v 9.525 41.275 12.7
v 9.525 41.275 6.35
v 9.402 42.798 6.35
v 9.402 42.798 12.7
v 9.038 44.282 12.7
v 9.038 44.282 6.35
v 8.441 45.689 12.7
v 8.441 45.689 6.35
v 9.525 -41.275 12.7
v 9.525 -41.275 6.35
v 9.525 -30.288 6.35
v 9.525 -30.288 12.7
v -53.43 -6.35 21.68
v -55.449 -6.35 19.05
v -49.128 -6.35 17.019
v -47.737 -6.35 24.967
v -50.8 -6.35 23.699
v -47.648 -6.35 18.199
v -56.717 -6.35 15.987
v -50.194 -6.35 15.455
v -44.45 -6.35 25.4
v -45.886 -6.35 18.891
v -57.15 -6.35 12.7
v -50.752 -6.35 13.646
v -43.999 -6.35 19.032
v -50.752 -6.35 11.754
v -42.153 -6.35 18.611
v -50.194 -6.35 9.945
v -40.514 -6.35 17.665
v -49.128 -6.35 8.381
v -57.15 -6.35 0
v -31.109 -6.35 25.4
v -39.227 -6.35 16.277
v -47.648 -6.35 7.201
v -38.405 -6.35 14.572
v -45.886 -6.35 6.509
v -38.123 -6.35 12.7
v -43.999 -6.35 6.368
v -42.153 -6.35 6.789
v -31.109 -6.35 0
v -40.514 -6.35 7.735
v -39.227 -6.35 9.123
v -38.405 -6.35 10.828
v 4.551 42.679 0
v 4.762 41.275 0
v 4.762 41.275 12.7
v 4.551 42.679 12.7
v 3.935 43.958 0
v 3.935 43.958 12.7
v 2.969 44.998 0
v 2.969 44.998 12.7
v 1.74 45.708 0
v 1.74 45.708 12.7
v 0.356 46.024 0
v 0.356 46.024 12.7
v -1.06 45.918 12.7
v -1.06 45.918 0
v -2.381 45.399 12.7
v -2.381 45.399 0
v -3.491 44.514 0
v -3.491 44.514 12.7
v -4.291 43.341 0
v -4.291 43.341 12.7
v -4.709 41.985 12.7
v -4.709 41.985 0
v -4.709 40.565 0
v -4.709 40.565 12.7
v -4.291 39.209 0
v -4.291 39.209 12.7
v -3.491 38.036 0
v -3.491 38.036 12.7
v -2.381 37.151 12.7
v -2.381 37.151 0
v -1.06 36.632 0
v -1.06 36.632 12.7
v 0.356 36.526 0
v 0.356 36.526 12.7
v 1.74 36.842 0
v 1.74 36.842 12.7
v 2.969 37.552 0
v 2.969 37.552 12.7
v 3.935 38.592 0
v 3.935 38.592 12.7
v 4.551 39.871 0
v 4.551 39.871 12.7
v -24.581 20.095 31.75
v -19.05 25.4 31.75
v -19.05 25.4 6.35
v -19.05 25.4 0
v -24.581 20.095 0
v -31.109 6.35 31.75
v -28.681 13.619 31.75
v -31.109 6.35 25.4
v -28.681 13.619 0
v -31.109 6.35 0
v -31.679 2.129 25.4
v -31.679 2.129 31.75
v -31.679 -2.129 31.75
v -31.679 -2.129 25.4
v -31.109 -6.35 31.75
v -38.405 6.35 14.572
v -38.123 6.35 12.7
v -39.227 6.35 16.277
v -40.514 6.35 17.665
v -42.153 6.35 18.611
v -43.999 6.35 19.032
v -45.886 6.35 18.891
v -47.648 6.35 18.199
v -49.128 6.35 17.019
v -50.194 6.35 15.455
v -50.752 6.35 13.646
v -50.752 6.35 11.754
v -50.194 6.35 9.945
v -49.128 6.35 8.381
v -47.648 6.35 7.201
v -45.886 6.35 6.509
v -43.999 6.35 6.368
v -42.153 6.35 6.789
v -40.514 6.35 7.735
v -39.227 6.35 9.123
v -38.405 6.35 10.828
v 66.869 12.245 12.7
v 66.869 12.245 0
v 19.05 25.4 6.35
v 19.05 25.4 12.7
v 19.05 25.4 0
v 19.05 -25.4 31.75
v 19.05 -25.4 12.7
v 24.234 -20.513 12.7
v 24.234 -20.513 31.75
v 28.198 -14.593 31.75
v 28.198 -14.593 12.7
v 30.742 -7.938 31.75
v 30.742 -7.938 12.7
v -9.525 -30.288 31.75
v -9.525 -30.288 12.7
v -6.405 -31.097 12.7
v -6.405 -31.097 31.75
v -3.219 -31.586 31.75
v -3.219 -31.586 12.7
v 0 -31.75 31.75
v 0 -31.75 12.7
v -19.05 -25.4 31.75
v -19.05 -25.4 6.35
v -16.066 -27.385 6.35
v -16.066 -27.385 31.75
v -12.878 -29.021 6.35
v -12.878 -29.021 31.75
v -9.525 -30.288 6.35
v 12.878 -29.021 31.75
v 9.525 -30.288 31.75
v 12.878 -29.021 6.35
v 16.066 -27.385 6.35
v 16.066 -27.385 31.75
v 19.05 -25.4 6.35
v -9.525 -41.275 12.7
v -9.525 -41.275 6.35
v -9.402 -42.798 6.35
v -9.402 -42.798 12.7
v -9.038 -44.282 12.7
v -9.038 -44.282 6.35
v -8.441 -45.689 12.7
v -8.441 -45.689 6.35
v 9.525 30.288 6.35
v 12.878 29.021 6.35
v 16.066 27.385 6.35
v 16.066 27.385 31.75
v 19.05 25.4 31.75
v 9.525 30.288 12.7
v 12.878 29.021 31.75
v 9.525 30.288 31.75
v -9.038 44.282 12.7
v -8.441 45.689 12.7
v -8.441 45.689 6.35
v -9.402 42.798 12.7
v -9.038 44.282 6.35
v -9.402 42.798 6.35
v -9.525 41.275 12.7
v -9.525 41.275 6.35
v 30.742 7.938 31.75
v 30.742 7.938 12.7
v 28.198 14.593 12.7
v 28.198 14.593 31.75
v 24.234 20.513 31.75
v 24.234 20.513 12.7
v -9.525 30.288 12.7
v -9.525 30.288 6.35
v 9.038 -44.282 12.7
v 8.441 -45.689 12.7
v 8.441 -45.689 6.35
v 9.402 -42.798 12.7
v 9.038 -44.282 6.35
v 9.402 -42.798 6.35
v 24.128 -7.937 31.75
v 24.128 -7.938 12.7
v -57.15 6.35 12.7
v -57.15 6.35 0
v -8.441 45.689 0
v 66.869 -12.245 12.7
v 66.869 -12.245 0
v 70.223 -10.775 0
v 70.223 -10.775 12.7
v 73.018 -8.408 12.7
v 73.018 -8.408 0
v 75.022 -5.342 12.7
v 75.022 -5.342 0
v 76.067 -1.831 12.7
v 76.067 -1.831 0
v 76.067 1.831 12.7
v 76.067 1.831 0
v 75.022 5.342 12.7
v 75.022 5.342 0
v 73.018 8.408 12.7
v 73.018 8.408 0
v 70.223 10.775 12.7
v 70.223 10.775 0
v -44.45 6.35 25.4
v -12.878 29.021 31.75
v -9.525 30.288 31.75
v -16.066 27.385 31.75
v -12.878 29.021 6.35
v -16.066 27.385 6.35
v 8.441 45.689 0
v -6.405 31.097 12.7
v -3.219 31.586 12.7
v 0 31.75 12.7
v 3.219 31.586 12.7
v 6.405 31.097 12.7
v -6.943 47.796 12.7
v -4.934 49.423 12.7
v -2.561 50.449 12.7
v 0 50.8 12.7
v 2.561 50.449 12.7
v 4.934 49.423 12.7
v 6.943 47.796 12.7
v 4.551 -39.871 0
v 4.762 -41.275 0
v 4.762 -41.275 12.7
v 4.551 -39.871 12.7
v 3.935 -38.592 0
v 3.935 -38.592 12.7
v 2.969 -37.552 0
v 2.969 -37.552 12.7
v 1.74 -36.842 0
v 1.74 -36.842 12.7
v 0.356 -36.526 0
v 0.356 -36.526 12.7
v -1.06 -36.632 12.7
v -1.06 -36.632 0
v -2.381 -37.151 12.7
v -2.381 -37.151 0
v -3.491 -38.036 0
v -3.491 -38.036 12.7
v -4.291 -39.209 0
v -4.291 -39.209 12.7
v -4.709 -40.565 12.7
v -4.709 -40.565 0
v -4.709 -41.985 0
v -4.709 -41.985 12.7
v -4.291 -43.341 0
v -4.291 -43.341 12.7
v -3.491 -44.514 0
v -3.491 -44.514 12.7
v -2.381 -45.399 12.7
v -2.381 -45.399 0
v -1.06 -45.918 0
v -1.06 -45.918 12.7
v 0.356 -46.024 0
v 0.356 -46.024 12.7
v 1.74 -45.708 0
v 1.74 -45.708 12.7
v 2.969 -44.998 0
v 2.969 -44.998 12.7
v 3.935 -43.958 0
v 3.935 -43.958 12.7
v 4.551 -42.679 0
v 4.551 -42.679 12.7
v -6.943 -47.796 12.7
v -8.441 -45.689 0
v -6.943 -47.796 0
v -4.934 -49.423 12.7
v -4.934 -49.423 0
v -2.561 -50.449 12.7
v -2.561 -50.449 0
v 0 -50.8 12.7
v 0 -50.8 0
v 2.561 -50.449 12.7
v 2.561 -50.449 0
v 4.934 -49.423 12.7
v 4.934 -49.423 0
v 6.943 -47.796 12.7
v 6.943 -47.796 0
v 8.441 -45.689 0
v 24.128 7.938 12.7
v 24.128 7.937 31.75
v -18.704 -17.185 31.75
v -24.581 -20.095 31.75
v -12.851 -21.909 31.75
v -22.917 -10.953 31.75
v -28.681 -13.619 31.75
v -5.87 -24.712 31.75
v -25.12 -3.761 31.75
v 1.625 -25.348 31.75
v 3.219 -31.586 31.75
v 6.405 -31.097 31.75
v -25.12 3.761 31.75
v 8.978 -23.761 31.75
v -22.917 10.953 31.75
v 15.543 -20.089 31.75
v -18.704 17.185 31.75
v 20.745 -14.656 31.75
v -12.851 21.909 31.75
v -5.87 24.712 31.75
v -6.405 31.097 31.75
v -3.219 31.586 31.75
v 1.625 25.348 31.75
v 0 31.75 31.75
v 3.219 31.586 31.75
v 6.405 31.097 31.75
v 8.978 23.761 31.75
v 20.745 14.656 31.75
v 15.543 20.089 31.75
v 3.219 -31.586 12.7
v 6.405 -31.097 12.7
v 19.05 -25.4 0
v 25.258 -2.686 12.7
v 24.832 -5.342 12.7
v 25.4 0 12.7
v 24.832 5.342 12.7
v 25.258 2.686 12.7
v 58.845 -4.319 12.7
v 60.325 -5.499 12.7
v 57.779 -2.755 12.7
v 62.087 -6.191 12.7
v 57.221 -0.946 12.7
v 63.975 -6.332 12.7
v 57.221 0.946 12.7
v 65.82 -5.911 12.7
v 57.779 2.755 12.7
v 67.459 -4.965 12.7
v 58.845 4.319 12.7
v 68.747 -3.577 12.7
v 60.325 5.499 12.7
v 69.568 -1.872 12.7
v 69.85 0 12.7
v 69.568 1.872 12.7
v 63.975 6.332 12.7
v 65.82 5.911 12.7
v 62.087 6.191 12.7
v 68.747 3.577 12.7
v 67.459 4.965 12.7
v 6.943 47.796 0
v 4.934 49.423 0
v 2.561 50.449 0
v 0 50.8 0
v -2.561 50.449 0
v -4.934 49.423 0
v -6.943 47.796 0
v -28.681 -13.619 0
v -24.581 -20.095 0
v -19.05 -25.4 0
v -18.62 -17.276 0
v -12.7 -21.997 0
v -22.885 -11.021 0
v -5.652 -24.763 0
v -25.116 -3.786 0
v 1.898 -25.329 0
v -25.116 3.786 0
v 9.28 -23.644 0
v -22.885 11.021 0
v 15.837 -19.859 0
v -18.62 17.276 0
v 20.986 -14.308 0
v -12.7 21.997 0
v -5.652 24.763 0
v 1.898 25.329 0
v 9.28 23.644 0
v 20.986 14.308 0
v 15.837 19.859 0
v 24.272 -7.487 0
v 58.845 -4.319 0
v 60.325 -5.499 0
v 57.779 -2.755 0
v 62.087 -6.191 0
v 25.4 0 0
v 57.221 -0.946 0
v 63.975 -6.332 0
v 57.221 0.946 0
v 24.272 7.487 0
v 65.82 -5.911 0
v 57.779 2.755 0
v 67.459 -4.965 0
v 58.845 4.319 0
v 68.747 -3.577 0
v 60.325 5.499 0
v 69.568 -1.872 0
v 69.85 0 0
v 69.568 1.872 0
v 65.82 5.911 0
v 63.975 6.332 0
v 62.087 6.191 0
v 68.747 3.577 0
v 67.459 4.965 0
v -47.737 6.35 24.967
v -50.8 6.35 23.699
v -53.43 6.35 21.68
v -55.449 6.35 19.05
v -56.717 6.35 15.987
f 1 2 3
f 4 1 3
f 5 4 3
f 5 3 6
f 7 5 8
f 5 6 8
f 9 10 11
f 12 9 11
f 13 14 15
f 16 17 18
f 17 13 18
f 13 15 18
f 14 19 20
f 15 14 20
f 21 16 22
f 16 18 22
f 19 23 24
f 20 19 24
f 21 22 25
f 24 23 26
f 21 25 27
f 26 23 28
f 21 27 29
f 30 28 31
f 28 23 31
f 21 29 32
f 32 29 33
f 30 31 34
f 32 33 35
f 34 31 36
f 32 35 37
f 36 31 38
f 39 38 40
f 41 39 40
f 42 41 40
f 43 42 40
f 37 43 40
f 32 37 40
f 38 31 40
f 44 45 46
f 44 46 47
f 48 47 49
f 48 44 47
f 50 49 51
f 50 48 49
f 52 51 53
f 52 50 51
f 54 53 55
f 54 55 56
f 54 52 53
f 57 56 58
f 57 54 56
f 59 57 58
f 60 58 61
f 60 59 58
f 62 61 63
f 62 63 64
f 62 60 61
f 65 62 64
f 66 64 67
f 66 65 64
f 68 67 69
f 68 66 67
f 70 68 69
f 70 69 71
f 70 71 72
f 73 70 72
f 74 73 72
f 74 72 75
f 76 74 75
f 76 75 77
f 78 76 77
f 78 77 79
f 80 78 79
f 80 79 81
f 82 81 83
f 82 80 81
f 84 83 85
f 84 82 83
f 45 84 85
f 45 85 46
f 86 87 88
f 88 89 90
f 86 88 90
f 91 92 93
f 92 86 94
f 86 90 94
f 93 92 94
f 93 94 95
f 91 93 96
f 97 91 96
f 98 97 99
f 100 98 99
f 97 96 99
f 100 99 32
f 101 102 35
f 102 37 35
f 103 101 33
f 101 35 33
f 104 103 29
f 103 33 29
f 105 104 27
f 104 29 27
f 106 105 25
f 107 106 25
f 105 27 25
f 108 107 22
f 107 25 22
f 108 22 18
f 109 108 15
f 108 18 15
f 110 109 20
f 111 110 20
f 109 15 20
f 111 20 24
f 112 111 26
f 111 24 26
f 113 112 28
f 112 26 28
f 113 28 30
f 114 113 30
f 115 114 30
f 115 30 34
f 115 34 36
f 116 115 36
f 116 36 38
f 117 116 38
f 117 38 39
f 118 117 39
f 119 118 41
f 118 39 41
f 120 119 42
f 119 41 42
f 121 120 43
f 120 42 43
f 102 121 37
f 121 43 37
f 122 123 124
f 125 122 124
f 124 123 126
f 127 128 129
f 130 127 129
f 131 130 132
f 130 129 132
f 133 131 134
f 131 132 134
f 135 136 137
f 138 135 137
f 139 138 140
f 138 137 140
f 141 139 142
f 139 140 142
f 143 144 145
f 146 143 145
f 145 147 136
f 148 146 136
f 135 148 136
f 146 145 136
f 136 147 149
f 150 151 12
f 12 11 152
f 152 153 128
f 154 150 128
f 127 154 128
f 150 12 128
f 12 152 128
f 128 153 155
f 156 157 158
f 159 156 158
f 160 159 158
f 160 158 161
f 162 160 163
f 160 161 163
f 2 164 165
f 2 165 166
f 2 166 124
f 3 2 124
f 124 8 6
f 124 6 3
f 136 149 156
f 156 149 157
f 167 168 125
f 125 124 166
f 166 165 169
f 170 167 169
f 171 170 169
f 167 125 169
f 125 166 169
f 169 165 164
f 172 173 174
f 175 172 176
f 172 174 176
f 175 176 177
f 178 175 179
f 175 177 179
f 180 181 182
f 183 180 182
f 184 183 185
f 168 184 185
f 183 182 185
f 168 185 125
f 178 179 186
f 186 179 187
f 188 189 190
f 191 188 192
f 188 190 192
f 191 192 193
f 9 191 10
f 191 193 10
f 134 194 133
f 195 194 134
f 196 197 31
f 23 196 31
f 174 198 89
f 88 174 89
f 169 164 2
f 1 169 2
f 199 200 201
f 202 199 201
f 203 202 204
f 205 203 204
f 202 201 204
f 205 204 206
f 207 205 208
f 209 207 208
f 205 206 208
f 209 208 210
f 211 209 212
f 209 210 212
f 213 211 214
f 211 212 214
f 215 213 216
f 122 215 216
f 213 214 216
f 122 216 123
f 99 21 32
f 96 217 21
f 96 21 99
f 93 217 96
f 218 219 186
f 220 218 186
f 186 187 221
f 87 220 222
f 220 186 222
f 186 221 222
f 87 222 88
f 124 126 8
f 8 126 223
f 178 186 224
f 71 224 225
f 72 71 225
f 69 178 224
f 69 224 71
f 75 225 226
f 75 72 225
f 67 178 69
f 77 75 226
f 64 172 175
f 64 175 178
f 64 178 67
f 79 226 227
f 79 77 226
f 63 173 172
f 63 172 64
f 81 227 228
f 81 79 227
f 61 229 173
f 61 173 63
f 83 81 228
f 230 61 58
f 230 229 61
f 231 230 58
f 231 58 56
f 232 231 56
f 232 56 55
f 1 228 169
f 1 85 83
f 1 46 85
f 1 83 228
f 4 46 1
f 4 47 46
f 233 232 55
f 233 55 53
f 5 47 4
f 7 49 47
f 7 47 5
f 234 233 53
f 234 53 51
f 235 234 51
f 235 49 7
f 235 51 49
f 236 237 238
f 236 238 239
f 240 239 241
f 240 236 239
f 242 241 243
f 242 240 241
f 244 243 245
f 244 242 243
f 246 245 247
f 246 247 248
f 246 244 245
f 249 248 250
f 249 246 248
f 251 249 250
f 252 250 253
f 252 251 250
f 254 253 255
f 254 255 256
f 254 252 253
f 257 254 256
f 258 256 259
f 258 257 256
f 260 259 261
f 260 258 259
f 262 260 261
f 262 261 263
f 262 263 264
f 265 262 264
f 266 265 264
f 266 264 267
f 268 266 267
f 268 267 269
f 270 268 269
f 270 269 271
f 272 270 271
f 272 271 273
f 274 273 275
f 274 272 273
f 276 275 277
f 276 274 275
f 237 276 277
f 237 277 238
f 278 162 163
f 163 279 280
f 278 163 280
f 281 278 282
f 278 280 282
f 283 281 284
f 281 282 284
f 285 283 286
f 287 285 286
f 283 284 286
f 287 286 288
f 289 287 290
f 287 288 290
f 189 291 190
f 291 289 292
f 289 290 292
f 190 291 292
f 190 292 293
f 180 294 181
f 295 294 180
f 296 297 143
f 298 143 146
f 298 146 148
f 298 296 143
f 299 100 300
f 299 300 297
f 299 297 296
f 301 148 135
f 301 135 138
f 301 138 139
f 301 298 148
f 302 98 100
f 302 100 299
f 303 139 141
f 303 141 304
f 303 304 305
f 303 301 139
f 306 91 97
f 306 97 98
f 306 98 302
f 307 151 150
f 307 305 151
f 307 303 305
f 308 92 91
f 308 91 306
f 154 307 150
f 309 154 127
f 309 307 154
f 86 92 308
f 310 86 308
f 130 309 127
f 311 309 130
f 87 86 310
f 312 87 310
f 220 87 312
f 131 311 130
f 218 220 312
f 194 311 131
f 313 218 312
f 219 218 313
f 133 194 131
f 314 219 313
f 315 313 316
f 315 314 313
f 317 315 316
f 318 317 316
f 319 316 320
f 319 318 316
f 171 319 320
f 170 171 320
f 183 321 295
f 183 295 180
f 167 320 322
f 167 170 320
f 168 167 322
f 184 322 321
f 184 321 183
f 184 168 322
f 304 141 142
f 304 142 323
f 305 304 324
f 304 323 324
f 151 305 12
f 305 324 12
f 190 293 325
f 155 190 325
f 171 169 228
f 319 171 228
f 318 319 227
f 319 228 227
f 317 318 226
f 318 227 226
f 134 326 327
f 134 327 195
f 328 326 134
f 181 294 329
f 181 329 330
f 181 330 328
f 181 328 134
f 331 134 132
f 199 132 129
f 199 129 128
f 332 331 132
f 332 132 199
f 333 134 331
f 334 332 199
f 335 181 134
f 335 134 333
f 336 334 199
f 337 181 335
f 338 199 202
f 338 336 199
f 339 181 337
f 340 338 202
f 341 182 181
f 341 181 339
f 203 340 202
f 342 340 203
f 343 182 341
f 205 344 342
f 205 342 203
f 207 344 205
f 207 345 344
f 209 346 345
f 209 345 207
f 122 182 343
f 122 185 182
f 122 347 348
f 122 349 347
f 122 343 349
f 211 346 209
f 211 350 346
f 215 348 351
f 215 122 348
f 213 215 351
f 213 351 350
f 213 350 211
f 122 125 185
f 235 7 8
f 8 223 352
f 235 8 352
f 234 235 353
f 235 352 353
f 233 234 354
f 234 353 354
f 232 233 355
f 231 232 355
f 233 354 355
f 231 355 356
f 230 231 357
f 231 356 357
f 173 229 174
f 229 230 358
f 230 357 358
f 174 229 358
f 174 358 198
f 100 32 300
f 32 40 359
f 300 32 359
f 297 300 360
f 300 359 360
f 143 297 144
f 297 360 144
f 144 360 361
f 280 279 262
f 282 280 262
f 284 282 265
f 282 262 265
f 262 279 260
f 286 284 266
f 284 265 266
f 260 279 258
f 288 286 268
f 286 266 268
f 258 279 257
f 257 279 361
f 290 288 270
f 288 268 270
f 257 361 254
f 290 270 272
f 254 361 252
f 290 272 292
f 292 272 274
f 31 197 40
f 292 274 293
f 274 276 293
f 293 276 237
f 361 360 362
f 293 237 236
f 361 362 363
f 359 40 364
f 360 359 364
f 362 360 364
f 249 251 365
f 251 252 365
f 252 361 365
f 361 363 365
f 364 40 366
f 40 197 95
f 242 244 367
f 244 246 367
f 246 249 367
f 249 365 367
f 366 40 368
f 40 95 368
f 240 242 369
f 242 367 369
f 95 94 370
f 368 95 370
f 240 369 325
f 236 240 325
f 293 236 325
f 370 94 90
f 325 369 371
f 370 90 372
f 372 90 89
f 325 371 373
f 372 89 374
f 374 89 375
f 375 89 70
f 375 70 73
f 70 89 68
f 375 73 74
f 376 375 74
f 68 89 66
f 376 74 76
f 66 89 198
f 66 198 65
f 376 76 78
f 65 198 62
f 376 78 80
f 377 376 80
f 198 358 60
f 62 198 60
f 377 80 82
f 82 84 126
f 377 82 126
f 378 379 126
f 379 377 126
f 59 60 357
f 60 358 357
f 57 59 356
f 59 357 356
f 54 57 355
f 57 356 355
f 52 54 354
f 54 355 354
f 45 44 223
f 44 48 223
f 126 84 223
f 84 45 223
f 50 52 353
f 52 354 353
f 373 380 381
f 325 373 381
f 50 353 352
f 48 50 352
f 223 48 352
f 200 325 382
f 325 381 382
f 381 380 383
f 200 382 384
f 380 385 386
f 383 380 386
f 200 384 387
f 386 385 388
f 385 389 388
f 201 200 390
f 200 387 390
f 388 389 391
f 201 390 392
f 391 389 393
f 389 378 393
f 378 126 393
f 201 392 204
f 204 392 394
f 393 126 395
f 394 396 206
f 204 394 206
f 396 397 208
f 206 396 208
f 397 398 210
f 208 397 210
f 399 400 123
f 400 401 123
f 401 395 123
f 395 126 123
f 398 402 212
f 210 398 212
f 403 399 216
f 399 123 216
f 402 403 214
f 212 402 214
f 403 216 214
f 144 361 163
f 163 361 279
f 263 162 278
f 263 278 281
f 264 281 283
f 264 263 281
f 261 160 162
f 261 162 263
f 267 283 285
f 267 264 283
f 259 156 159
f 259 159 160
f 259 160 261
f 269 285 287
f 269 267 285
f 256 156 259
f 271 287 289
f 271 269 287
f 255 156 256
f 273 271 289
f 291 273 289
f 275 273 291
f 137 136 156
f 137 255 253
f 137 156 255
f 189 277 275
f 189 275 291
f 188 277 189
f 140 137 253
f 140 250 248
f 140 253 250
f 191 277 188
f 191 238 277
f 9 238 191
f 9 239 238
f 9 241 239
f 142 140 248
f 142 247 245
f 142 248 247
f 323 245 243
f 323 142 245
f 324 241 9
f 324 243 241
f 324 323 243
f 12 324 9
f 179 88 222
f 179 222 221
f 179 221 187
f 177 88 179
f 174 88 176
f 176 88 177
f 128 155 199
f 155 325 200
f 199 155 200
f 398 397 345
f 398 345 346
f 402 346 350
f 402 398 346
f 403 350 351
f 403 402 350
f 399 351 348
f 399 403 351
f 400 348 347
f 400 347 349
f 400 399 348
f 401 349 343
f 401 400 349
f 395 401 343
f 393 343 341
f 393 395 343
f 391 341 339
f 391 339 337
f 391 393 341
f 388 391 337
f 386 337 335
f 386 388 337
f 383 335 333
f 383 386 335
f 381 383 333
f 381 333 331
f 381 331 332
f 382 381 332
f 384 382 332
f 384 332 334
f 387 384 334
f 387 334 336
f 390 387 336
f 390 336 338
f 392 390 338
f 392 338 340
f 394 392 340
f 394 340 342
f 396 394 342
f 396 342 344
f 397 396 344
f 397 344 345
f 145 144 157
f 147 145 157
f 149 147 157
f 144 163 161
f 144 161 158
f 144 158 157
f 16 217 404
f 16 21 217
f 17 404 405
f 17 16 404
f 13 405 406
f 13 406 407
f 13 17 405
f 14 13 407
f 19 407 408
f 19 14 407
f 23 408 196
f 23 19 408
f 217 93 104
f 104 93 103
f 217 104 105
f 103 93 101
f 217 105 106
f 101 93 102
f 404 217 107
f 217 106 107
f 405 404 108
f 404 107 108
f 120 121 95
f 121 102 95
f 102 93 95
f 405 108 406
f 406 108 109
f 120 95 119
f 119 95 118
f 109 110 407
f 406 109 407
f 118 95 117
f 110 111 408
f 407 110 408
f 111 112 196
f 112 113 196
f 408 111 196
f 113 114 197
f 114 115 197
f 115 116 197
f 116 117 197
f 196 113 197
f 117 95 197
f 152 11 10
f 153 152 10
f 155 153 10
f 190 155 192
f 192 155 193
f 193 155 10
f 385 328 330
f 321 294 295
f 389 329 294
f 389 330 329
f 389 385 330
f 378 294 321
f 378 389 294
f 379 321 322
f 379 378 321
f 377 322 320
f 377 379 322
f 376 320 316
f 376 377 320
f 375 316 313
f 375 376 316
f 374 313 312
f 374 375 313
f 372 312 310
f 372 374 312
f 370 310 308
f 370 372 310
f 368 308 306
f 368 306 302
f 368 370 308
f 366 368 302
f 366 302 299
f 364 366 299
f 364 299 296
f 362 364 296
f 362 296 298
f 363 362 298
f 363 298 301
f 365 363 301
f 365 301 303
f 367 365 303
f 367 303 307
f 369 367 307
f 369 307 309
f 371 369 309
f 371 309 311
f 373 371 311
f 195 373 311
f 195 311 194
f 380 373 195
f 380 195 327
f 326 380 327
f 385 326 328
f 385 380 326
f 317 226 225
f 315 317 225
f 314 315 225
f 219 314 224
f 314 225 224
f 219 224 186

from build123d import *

# Parameters (mm, degrees)
F0_R      = 25.4
F1_DEPTH  = 31.75
F0_R_2    = 4.7625
F0_R_3    = 6.35
F2_DEPTH  = 12.7
F3_DEPTH  = 6.35
F4_DEPTH  = 25.4
F5_R      = 6.35
F6_DEPTH  = 6.35
F7_DEPTH  = 6.35
F8_R      = 12.7
F10_DEPTH = 31.75
F11_DEPTH = 63.5


with BuildPart() as f1:
    # F0 (on Top) → F1 (new body)
    with BuildSketch(Plane.XY):
        with BuildLine():
            ThreePointArc((19.05, -25.4), (28.3980633142, -14.1990316571), (31.75, 0))
            ThreePointArc((31.75, 0), (28.3980633142, 14.1990316571), (19.05, 25.4))
            ThreePointArc((19.05, 25.4), (14.4949901866, 28.2481461249), (9.525, 30.287569645))
            ThreePointArc((9.525, 30.287569645), (4.8183069939, 31.3822627883), (8.43e-08, 31.75))
            ThreePointArc((8.43e-08, 31.75), (-4.8183069106, 31.3822628011), (-9.525, 30.287569645))
            ThreePointArc((-9.525, 30.287569645), (-14.4949901866, 28.2481461249), (-19.05, 25.4))
            ThreePointArc((-19.05, 25.4), (-26.8271299333, 16.9813898), (-31.1085197333, 6.35))
            ThreePointArc((-31.1085197333, 6.35), (-31.75, 0), (-31.1085197333, -6.35))
            ThreePointArc((-31.1085197333, -6.35), (-26.8271299333, -16.9813898), (-19.05, -25.4))
            ThreePointArc((-19.05, -25.4), (-14.4949901866, -28.2481461249), (-9.525, -30.287569645))
            ThreePointArc((-9.525, -30.287569645), (-4.8183069522, -31.3822627947), (0, -31.75))
            ThreePointArc((0, -31.75), (4.8183069522, -31.3822627947), (9.525, -30.287569645))
            ThreePointArc((9.525, -30.287569645), (14.4949901866, -28.2481461249), (19.05, -25.4))
        make_face()
        Circle(F0_R, mode=Mode.SUBTRACT)
    extrude(amount=F1_DEPTH)

    # F0 (on Top) → F2 (join)
    with BuildSketch(Plane.XY):
        with BuildLine():
            ThreePointArc((9.525, 41.275), (9.2499372193, 43.5475066424), (8.4406353932, 45.6887624719))
            ThreePointArc((8.4406353932, 45.6887624719), (0, 50.8), (-8.4406353932, 45.6887624719))
            ThreePointArc((-8.4406353932, 45.6887624719), (-9.2499372193, 43.5475066424), (-9.525, 41.275))
            ThreePointArc((-9.525, 41.275), (-6.735192061, 34.5398078794), (8.43e-08, 31.75))
            ThreePointArc((8.43e-08, 31.75), (6.7351921206, 34.539807939), (9.525, 41.275))
        make_face()
        with Locations((0, 41.275)):
            Circle(F0_R_2, mode=Mode.SUBTRACT)
        with BuildLine():
            ThreePointArc((8.43e-08, 31.75), (4.8183069939, 31.3822627883), (9.525, 30.287569645))
            Line((9.525, 30.287569645), (9.525, 41.275))
            ThreePointArc((9.525, 41.275), (6.7351921206, 34.539807939), (8.43e-08, 31.75))
        make_face()
        with BuildLine():
            Line((9.525, -41.275), (9.525, -30.287569645))
            ThreePointArc((9.525, -30.287569645), (4.8183069522, -31.3822627947), (0, -31.75))
            ThreePointArc((0, -31.75), (6.7351920908, -34.5398079092), (9.525, -41.275))
        make_face()
        with BuildLine():
            ThreePointArc((-9.525, -41.275), (-6.7351920908, -34.5398079092), (0, -31.75))
            ThreePointArc((0, -31.75), (-4.8183069522, -31.3822627947), (-9.525, -30.287569645))
            Line((-9.525, -30.287569645), (-9.525, -41.275))
        make_face()
        with BuildLine():
            ThreePointArc((-8.4406353932, -45.6887624719), (0, -50.8), (8.4406353932, -45.6887624719))
            ThreePointArc((8.4406353932, -45.6887624719), (9.2499372193, -43.5475066424), (9.525, -41.275))
            ThreePointArc((9.525, -41.275), (6.7351920908, -34.5398079092), (0, -31.75))
            ThreePointArc((0, -31.75), (-6.7351920908, -34.5398079092), (-9.525, -41.275))
            ThreePointArc((-9.525, -41.275), (-9.2499372193, -43.5475066424), (-8.4406353932, -45.6887624719))
        make_face()
        with Locations((0, -41.275)):
            Circle(F0_R_2, mode=Mode.SUBTRACT)
        with BuildLine():
            ThreePointArc((-9.525, 30.287569645), (-4.8183069106, 31.3822628011), (8.43e-08, 31.75))
            ThreePointArc((8.43e-08, 31.75), (-6.735192061, 34.5398078794), (-9.525, 41.275))
            Line((-9.525, 41.275), (-9.525, 30.287569645))
        make_face()
        with BuildLine():
            ThreePointArc((19.05, 25.4), (28.3980633142, 14.1990316571), (31.75, 0))
            ThreePointArc((31.75, 0), (28.3980633142, -14.1990316571), (19.05, -25.4))
            Line((19.05, -25.4), (66.8686259006, -12.245095326))
            ThreePointArc((66.8686259006, -12.245095326), (76.2, 0), (66.8686259006, 12.245095326))
            Line((66.8686259006, 12.245095326), (19.05, 25.4))
        make_face()
        with Locations((63.5, 0)):
            Circle(F0_R_3, mode=Mode.SUBTRACT)
    extrude(amount=F2_DEPTH)

    # F0 (on Top) → F3 (join)
    with BuildSketch(Plane.XY):
        with BuildLine():
            ThreePointArc((-9.525, 41.275), (-9.2499372193, 43.5475066424), (-8.4406353932, 45.6887624719))
            Line((-8.4406353932, 45.6887624719), (-19.05, 25.4))
            ThreePointArc((-19.05, 25.4), (-14.4949901866, 28.2481461249), (-9.525, 30.287569645))
            Line((-9.525, 30.287569645), (-9.525, 41.275))
        make_face()
        with BuildLine():
            ThreePointArc((9.525, 30.287569645), (14.4949901866, 28.2481461249), (19.05, 25.4))
            Line((19.05, 25.4), (8.4406353932, 45.6887624719))
            ThreePointArc((8.4406353932, 45.6887624719), (9.2499372193, 43.5475066424), (9.525, 41.275))
            Line((9.525, 41.275), (9.525, 30.287569645))
        make_face()
        with BuildLine():
            Line((8.4406353932, -45.6887624719), (19.05, -25.4))
            ThreePointArc((19.05, -25.4), (14.4949901866, -28.2481461249), (9.525, -30.287569645))
            Line((9.525, -30.287569645), (9.525, -41.275))
            ThreePointArc((9.525, -41.275), (9.2499372193, -43.5475066424), (8.4406353932, -45.6887624719))
        make_face()
        with BuildLine():
            Line((-19.05, -25.4), (-8.4406353932, -45.6887624719))
            ThreePointArc((-8.4406353932, -45.6887624719), (-9.2499372193, -43.5475066424), (-9.525, -41.275))
            Line((-9.525, -41.275), (-9.525, -30.287569645))
            ThreePointArc((-9.525, -30.287569645), (-14.4949901866, -28.2481461249), (-19.05, -25.4))
        make_face()
    extrude(amount=F3_DEPTH)

    # F0 (on Top) → F4 (join)
    with BuildSketch(Plane.XY):
        with BuildLine():
            ThreePointArc((-31.1085197333, -6.35), (-31.75, 0), (-31.1085197333, 6.35))
            Line((-31.1085197333, 6.35), (-57.15, 6.35))
            Line((-57.15, 6.35), (-57.15, 0))
            Line((-57.15, 0), (-57.15, -6.35))
            Line((-57.15, -6.35), (-31.1085197333, -6.35))
        make_face()
    extrude(amount=F4_DEPTH)

    # F5 (on Front) → F6 (cut, symmetric)
    with BuildSketch(Plane.XZ):
        with Locations((-44.4733425975, 12.6999998465)):
            Circle(F5_R)
    extrude(amount=F6_DEPTH, both=True, mode=Mode.SUBTRACT)

    # F5 (on Front) → F7 (cut, symmetric)
    with BuildSketch(Plane.XZ):
        with Locations((-44.4733425975, 12.6999998465)):
            Circle(F5_R)
    extrude(amount=F7_DEPTH, both=True, mode=Mode.SUBTRACT)

    # F8
    f8_edges = [f1.edges().sort_by_distance(p)[0] for p in [
        (-57.15, 0, 25.4),
    ]]
    fillet(f8_edges, radius=F8_R)

    # F9 (on Right) → F10 (cut)
    with BuildSketch(Plane.YZ):
        Polygon((0, 31.75), (-7.9375, 31.75), (-7.9375, 12.7), (7.9375, 12.7), (7.9375, 31.75), align=None)
    extrude(amount=F10_DEPTH, mode=Mode.SUBTRACT)

    # F9 (on Right) → F11 (cut)
    with BuildSketch(Plane.YZ):
        Polygon((0, 31.75), (-7.9375, 31.75), (-7.9375, 12.7), (7.9375, 12.7), (7.9375, 31.75), align=None)
    extrude(amount=F11_DEPTH, mode=Mode.SUBTRACT)


solid = f1.part
